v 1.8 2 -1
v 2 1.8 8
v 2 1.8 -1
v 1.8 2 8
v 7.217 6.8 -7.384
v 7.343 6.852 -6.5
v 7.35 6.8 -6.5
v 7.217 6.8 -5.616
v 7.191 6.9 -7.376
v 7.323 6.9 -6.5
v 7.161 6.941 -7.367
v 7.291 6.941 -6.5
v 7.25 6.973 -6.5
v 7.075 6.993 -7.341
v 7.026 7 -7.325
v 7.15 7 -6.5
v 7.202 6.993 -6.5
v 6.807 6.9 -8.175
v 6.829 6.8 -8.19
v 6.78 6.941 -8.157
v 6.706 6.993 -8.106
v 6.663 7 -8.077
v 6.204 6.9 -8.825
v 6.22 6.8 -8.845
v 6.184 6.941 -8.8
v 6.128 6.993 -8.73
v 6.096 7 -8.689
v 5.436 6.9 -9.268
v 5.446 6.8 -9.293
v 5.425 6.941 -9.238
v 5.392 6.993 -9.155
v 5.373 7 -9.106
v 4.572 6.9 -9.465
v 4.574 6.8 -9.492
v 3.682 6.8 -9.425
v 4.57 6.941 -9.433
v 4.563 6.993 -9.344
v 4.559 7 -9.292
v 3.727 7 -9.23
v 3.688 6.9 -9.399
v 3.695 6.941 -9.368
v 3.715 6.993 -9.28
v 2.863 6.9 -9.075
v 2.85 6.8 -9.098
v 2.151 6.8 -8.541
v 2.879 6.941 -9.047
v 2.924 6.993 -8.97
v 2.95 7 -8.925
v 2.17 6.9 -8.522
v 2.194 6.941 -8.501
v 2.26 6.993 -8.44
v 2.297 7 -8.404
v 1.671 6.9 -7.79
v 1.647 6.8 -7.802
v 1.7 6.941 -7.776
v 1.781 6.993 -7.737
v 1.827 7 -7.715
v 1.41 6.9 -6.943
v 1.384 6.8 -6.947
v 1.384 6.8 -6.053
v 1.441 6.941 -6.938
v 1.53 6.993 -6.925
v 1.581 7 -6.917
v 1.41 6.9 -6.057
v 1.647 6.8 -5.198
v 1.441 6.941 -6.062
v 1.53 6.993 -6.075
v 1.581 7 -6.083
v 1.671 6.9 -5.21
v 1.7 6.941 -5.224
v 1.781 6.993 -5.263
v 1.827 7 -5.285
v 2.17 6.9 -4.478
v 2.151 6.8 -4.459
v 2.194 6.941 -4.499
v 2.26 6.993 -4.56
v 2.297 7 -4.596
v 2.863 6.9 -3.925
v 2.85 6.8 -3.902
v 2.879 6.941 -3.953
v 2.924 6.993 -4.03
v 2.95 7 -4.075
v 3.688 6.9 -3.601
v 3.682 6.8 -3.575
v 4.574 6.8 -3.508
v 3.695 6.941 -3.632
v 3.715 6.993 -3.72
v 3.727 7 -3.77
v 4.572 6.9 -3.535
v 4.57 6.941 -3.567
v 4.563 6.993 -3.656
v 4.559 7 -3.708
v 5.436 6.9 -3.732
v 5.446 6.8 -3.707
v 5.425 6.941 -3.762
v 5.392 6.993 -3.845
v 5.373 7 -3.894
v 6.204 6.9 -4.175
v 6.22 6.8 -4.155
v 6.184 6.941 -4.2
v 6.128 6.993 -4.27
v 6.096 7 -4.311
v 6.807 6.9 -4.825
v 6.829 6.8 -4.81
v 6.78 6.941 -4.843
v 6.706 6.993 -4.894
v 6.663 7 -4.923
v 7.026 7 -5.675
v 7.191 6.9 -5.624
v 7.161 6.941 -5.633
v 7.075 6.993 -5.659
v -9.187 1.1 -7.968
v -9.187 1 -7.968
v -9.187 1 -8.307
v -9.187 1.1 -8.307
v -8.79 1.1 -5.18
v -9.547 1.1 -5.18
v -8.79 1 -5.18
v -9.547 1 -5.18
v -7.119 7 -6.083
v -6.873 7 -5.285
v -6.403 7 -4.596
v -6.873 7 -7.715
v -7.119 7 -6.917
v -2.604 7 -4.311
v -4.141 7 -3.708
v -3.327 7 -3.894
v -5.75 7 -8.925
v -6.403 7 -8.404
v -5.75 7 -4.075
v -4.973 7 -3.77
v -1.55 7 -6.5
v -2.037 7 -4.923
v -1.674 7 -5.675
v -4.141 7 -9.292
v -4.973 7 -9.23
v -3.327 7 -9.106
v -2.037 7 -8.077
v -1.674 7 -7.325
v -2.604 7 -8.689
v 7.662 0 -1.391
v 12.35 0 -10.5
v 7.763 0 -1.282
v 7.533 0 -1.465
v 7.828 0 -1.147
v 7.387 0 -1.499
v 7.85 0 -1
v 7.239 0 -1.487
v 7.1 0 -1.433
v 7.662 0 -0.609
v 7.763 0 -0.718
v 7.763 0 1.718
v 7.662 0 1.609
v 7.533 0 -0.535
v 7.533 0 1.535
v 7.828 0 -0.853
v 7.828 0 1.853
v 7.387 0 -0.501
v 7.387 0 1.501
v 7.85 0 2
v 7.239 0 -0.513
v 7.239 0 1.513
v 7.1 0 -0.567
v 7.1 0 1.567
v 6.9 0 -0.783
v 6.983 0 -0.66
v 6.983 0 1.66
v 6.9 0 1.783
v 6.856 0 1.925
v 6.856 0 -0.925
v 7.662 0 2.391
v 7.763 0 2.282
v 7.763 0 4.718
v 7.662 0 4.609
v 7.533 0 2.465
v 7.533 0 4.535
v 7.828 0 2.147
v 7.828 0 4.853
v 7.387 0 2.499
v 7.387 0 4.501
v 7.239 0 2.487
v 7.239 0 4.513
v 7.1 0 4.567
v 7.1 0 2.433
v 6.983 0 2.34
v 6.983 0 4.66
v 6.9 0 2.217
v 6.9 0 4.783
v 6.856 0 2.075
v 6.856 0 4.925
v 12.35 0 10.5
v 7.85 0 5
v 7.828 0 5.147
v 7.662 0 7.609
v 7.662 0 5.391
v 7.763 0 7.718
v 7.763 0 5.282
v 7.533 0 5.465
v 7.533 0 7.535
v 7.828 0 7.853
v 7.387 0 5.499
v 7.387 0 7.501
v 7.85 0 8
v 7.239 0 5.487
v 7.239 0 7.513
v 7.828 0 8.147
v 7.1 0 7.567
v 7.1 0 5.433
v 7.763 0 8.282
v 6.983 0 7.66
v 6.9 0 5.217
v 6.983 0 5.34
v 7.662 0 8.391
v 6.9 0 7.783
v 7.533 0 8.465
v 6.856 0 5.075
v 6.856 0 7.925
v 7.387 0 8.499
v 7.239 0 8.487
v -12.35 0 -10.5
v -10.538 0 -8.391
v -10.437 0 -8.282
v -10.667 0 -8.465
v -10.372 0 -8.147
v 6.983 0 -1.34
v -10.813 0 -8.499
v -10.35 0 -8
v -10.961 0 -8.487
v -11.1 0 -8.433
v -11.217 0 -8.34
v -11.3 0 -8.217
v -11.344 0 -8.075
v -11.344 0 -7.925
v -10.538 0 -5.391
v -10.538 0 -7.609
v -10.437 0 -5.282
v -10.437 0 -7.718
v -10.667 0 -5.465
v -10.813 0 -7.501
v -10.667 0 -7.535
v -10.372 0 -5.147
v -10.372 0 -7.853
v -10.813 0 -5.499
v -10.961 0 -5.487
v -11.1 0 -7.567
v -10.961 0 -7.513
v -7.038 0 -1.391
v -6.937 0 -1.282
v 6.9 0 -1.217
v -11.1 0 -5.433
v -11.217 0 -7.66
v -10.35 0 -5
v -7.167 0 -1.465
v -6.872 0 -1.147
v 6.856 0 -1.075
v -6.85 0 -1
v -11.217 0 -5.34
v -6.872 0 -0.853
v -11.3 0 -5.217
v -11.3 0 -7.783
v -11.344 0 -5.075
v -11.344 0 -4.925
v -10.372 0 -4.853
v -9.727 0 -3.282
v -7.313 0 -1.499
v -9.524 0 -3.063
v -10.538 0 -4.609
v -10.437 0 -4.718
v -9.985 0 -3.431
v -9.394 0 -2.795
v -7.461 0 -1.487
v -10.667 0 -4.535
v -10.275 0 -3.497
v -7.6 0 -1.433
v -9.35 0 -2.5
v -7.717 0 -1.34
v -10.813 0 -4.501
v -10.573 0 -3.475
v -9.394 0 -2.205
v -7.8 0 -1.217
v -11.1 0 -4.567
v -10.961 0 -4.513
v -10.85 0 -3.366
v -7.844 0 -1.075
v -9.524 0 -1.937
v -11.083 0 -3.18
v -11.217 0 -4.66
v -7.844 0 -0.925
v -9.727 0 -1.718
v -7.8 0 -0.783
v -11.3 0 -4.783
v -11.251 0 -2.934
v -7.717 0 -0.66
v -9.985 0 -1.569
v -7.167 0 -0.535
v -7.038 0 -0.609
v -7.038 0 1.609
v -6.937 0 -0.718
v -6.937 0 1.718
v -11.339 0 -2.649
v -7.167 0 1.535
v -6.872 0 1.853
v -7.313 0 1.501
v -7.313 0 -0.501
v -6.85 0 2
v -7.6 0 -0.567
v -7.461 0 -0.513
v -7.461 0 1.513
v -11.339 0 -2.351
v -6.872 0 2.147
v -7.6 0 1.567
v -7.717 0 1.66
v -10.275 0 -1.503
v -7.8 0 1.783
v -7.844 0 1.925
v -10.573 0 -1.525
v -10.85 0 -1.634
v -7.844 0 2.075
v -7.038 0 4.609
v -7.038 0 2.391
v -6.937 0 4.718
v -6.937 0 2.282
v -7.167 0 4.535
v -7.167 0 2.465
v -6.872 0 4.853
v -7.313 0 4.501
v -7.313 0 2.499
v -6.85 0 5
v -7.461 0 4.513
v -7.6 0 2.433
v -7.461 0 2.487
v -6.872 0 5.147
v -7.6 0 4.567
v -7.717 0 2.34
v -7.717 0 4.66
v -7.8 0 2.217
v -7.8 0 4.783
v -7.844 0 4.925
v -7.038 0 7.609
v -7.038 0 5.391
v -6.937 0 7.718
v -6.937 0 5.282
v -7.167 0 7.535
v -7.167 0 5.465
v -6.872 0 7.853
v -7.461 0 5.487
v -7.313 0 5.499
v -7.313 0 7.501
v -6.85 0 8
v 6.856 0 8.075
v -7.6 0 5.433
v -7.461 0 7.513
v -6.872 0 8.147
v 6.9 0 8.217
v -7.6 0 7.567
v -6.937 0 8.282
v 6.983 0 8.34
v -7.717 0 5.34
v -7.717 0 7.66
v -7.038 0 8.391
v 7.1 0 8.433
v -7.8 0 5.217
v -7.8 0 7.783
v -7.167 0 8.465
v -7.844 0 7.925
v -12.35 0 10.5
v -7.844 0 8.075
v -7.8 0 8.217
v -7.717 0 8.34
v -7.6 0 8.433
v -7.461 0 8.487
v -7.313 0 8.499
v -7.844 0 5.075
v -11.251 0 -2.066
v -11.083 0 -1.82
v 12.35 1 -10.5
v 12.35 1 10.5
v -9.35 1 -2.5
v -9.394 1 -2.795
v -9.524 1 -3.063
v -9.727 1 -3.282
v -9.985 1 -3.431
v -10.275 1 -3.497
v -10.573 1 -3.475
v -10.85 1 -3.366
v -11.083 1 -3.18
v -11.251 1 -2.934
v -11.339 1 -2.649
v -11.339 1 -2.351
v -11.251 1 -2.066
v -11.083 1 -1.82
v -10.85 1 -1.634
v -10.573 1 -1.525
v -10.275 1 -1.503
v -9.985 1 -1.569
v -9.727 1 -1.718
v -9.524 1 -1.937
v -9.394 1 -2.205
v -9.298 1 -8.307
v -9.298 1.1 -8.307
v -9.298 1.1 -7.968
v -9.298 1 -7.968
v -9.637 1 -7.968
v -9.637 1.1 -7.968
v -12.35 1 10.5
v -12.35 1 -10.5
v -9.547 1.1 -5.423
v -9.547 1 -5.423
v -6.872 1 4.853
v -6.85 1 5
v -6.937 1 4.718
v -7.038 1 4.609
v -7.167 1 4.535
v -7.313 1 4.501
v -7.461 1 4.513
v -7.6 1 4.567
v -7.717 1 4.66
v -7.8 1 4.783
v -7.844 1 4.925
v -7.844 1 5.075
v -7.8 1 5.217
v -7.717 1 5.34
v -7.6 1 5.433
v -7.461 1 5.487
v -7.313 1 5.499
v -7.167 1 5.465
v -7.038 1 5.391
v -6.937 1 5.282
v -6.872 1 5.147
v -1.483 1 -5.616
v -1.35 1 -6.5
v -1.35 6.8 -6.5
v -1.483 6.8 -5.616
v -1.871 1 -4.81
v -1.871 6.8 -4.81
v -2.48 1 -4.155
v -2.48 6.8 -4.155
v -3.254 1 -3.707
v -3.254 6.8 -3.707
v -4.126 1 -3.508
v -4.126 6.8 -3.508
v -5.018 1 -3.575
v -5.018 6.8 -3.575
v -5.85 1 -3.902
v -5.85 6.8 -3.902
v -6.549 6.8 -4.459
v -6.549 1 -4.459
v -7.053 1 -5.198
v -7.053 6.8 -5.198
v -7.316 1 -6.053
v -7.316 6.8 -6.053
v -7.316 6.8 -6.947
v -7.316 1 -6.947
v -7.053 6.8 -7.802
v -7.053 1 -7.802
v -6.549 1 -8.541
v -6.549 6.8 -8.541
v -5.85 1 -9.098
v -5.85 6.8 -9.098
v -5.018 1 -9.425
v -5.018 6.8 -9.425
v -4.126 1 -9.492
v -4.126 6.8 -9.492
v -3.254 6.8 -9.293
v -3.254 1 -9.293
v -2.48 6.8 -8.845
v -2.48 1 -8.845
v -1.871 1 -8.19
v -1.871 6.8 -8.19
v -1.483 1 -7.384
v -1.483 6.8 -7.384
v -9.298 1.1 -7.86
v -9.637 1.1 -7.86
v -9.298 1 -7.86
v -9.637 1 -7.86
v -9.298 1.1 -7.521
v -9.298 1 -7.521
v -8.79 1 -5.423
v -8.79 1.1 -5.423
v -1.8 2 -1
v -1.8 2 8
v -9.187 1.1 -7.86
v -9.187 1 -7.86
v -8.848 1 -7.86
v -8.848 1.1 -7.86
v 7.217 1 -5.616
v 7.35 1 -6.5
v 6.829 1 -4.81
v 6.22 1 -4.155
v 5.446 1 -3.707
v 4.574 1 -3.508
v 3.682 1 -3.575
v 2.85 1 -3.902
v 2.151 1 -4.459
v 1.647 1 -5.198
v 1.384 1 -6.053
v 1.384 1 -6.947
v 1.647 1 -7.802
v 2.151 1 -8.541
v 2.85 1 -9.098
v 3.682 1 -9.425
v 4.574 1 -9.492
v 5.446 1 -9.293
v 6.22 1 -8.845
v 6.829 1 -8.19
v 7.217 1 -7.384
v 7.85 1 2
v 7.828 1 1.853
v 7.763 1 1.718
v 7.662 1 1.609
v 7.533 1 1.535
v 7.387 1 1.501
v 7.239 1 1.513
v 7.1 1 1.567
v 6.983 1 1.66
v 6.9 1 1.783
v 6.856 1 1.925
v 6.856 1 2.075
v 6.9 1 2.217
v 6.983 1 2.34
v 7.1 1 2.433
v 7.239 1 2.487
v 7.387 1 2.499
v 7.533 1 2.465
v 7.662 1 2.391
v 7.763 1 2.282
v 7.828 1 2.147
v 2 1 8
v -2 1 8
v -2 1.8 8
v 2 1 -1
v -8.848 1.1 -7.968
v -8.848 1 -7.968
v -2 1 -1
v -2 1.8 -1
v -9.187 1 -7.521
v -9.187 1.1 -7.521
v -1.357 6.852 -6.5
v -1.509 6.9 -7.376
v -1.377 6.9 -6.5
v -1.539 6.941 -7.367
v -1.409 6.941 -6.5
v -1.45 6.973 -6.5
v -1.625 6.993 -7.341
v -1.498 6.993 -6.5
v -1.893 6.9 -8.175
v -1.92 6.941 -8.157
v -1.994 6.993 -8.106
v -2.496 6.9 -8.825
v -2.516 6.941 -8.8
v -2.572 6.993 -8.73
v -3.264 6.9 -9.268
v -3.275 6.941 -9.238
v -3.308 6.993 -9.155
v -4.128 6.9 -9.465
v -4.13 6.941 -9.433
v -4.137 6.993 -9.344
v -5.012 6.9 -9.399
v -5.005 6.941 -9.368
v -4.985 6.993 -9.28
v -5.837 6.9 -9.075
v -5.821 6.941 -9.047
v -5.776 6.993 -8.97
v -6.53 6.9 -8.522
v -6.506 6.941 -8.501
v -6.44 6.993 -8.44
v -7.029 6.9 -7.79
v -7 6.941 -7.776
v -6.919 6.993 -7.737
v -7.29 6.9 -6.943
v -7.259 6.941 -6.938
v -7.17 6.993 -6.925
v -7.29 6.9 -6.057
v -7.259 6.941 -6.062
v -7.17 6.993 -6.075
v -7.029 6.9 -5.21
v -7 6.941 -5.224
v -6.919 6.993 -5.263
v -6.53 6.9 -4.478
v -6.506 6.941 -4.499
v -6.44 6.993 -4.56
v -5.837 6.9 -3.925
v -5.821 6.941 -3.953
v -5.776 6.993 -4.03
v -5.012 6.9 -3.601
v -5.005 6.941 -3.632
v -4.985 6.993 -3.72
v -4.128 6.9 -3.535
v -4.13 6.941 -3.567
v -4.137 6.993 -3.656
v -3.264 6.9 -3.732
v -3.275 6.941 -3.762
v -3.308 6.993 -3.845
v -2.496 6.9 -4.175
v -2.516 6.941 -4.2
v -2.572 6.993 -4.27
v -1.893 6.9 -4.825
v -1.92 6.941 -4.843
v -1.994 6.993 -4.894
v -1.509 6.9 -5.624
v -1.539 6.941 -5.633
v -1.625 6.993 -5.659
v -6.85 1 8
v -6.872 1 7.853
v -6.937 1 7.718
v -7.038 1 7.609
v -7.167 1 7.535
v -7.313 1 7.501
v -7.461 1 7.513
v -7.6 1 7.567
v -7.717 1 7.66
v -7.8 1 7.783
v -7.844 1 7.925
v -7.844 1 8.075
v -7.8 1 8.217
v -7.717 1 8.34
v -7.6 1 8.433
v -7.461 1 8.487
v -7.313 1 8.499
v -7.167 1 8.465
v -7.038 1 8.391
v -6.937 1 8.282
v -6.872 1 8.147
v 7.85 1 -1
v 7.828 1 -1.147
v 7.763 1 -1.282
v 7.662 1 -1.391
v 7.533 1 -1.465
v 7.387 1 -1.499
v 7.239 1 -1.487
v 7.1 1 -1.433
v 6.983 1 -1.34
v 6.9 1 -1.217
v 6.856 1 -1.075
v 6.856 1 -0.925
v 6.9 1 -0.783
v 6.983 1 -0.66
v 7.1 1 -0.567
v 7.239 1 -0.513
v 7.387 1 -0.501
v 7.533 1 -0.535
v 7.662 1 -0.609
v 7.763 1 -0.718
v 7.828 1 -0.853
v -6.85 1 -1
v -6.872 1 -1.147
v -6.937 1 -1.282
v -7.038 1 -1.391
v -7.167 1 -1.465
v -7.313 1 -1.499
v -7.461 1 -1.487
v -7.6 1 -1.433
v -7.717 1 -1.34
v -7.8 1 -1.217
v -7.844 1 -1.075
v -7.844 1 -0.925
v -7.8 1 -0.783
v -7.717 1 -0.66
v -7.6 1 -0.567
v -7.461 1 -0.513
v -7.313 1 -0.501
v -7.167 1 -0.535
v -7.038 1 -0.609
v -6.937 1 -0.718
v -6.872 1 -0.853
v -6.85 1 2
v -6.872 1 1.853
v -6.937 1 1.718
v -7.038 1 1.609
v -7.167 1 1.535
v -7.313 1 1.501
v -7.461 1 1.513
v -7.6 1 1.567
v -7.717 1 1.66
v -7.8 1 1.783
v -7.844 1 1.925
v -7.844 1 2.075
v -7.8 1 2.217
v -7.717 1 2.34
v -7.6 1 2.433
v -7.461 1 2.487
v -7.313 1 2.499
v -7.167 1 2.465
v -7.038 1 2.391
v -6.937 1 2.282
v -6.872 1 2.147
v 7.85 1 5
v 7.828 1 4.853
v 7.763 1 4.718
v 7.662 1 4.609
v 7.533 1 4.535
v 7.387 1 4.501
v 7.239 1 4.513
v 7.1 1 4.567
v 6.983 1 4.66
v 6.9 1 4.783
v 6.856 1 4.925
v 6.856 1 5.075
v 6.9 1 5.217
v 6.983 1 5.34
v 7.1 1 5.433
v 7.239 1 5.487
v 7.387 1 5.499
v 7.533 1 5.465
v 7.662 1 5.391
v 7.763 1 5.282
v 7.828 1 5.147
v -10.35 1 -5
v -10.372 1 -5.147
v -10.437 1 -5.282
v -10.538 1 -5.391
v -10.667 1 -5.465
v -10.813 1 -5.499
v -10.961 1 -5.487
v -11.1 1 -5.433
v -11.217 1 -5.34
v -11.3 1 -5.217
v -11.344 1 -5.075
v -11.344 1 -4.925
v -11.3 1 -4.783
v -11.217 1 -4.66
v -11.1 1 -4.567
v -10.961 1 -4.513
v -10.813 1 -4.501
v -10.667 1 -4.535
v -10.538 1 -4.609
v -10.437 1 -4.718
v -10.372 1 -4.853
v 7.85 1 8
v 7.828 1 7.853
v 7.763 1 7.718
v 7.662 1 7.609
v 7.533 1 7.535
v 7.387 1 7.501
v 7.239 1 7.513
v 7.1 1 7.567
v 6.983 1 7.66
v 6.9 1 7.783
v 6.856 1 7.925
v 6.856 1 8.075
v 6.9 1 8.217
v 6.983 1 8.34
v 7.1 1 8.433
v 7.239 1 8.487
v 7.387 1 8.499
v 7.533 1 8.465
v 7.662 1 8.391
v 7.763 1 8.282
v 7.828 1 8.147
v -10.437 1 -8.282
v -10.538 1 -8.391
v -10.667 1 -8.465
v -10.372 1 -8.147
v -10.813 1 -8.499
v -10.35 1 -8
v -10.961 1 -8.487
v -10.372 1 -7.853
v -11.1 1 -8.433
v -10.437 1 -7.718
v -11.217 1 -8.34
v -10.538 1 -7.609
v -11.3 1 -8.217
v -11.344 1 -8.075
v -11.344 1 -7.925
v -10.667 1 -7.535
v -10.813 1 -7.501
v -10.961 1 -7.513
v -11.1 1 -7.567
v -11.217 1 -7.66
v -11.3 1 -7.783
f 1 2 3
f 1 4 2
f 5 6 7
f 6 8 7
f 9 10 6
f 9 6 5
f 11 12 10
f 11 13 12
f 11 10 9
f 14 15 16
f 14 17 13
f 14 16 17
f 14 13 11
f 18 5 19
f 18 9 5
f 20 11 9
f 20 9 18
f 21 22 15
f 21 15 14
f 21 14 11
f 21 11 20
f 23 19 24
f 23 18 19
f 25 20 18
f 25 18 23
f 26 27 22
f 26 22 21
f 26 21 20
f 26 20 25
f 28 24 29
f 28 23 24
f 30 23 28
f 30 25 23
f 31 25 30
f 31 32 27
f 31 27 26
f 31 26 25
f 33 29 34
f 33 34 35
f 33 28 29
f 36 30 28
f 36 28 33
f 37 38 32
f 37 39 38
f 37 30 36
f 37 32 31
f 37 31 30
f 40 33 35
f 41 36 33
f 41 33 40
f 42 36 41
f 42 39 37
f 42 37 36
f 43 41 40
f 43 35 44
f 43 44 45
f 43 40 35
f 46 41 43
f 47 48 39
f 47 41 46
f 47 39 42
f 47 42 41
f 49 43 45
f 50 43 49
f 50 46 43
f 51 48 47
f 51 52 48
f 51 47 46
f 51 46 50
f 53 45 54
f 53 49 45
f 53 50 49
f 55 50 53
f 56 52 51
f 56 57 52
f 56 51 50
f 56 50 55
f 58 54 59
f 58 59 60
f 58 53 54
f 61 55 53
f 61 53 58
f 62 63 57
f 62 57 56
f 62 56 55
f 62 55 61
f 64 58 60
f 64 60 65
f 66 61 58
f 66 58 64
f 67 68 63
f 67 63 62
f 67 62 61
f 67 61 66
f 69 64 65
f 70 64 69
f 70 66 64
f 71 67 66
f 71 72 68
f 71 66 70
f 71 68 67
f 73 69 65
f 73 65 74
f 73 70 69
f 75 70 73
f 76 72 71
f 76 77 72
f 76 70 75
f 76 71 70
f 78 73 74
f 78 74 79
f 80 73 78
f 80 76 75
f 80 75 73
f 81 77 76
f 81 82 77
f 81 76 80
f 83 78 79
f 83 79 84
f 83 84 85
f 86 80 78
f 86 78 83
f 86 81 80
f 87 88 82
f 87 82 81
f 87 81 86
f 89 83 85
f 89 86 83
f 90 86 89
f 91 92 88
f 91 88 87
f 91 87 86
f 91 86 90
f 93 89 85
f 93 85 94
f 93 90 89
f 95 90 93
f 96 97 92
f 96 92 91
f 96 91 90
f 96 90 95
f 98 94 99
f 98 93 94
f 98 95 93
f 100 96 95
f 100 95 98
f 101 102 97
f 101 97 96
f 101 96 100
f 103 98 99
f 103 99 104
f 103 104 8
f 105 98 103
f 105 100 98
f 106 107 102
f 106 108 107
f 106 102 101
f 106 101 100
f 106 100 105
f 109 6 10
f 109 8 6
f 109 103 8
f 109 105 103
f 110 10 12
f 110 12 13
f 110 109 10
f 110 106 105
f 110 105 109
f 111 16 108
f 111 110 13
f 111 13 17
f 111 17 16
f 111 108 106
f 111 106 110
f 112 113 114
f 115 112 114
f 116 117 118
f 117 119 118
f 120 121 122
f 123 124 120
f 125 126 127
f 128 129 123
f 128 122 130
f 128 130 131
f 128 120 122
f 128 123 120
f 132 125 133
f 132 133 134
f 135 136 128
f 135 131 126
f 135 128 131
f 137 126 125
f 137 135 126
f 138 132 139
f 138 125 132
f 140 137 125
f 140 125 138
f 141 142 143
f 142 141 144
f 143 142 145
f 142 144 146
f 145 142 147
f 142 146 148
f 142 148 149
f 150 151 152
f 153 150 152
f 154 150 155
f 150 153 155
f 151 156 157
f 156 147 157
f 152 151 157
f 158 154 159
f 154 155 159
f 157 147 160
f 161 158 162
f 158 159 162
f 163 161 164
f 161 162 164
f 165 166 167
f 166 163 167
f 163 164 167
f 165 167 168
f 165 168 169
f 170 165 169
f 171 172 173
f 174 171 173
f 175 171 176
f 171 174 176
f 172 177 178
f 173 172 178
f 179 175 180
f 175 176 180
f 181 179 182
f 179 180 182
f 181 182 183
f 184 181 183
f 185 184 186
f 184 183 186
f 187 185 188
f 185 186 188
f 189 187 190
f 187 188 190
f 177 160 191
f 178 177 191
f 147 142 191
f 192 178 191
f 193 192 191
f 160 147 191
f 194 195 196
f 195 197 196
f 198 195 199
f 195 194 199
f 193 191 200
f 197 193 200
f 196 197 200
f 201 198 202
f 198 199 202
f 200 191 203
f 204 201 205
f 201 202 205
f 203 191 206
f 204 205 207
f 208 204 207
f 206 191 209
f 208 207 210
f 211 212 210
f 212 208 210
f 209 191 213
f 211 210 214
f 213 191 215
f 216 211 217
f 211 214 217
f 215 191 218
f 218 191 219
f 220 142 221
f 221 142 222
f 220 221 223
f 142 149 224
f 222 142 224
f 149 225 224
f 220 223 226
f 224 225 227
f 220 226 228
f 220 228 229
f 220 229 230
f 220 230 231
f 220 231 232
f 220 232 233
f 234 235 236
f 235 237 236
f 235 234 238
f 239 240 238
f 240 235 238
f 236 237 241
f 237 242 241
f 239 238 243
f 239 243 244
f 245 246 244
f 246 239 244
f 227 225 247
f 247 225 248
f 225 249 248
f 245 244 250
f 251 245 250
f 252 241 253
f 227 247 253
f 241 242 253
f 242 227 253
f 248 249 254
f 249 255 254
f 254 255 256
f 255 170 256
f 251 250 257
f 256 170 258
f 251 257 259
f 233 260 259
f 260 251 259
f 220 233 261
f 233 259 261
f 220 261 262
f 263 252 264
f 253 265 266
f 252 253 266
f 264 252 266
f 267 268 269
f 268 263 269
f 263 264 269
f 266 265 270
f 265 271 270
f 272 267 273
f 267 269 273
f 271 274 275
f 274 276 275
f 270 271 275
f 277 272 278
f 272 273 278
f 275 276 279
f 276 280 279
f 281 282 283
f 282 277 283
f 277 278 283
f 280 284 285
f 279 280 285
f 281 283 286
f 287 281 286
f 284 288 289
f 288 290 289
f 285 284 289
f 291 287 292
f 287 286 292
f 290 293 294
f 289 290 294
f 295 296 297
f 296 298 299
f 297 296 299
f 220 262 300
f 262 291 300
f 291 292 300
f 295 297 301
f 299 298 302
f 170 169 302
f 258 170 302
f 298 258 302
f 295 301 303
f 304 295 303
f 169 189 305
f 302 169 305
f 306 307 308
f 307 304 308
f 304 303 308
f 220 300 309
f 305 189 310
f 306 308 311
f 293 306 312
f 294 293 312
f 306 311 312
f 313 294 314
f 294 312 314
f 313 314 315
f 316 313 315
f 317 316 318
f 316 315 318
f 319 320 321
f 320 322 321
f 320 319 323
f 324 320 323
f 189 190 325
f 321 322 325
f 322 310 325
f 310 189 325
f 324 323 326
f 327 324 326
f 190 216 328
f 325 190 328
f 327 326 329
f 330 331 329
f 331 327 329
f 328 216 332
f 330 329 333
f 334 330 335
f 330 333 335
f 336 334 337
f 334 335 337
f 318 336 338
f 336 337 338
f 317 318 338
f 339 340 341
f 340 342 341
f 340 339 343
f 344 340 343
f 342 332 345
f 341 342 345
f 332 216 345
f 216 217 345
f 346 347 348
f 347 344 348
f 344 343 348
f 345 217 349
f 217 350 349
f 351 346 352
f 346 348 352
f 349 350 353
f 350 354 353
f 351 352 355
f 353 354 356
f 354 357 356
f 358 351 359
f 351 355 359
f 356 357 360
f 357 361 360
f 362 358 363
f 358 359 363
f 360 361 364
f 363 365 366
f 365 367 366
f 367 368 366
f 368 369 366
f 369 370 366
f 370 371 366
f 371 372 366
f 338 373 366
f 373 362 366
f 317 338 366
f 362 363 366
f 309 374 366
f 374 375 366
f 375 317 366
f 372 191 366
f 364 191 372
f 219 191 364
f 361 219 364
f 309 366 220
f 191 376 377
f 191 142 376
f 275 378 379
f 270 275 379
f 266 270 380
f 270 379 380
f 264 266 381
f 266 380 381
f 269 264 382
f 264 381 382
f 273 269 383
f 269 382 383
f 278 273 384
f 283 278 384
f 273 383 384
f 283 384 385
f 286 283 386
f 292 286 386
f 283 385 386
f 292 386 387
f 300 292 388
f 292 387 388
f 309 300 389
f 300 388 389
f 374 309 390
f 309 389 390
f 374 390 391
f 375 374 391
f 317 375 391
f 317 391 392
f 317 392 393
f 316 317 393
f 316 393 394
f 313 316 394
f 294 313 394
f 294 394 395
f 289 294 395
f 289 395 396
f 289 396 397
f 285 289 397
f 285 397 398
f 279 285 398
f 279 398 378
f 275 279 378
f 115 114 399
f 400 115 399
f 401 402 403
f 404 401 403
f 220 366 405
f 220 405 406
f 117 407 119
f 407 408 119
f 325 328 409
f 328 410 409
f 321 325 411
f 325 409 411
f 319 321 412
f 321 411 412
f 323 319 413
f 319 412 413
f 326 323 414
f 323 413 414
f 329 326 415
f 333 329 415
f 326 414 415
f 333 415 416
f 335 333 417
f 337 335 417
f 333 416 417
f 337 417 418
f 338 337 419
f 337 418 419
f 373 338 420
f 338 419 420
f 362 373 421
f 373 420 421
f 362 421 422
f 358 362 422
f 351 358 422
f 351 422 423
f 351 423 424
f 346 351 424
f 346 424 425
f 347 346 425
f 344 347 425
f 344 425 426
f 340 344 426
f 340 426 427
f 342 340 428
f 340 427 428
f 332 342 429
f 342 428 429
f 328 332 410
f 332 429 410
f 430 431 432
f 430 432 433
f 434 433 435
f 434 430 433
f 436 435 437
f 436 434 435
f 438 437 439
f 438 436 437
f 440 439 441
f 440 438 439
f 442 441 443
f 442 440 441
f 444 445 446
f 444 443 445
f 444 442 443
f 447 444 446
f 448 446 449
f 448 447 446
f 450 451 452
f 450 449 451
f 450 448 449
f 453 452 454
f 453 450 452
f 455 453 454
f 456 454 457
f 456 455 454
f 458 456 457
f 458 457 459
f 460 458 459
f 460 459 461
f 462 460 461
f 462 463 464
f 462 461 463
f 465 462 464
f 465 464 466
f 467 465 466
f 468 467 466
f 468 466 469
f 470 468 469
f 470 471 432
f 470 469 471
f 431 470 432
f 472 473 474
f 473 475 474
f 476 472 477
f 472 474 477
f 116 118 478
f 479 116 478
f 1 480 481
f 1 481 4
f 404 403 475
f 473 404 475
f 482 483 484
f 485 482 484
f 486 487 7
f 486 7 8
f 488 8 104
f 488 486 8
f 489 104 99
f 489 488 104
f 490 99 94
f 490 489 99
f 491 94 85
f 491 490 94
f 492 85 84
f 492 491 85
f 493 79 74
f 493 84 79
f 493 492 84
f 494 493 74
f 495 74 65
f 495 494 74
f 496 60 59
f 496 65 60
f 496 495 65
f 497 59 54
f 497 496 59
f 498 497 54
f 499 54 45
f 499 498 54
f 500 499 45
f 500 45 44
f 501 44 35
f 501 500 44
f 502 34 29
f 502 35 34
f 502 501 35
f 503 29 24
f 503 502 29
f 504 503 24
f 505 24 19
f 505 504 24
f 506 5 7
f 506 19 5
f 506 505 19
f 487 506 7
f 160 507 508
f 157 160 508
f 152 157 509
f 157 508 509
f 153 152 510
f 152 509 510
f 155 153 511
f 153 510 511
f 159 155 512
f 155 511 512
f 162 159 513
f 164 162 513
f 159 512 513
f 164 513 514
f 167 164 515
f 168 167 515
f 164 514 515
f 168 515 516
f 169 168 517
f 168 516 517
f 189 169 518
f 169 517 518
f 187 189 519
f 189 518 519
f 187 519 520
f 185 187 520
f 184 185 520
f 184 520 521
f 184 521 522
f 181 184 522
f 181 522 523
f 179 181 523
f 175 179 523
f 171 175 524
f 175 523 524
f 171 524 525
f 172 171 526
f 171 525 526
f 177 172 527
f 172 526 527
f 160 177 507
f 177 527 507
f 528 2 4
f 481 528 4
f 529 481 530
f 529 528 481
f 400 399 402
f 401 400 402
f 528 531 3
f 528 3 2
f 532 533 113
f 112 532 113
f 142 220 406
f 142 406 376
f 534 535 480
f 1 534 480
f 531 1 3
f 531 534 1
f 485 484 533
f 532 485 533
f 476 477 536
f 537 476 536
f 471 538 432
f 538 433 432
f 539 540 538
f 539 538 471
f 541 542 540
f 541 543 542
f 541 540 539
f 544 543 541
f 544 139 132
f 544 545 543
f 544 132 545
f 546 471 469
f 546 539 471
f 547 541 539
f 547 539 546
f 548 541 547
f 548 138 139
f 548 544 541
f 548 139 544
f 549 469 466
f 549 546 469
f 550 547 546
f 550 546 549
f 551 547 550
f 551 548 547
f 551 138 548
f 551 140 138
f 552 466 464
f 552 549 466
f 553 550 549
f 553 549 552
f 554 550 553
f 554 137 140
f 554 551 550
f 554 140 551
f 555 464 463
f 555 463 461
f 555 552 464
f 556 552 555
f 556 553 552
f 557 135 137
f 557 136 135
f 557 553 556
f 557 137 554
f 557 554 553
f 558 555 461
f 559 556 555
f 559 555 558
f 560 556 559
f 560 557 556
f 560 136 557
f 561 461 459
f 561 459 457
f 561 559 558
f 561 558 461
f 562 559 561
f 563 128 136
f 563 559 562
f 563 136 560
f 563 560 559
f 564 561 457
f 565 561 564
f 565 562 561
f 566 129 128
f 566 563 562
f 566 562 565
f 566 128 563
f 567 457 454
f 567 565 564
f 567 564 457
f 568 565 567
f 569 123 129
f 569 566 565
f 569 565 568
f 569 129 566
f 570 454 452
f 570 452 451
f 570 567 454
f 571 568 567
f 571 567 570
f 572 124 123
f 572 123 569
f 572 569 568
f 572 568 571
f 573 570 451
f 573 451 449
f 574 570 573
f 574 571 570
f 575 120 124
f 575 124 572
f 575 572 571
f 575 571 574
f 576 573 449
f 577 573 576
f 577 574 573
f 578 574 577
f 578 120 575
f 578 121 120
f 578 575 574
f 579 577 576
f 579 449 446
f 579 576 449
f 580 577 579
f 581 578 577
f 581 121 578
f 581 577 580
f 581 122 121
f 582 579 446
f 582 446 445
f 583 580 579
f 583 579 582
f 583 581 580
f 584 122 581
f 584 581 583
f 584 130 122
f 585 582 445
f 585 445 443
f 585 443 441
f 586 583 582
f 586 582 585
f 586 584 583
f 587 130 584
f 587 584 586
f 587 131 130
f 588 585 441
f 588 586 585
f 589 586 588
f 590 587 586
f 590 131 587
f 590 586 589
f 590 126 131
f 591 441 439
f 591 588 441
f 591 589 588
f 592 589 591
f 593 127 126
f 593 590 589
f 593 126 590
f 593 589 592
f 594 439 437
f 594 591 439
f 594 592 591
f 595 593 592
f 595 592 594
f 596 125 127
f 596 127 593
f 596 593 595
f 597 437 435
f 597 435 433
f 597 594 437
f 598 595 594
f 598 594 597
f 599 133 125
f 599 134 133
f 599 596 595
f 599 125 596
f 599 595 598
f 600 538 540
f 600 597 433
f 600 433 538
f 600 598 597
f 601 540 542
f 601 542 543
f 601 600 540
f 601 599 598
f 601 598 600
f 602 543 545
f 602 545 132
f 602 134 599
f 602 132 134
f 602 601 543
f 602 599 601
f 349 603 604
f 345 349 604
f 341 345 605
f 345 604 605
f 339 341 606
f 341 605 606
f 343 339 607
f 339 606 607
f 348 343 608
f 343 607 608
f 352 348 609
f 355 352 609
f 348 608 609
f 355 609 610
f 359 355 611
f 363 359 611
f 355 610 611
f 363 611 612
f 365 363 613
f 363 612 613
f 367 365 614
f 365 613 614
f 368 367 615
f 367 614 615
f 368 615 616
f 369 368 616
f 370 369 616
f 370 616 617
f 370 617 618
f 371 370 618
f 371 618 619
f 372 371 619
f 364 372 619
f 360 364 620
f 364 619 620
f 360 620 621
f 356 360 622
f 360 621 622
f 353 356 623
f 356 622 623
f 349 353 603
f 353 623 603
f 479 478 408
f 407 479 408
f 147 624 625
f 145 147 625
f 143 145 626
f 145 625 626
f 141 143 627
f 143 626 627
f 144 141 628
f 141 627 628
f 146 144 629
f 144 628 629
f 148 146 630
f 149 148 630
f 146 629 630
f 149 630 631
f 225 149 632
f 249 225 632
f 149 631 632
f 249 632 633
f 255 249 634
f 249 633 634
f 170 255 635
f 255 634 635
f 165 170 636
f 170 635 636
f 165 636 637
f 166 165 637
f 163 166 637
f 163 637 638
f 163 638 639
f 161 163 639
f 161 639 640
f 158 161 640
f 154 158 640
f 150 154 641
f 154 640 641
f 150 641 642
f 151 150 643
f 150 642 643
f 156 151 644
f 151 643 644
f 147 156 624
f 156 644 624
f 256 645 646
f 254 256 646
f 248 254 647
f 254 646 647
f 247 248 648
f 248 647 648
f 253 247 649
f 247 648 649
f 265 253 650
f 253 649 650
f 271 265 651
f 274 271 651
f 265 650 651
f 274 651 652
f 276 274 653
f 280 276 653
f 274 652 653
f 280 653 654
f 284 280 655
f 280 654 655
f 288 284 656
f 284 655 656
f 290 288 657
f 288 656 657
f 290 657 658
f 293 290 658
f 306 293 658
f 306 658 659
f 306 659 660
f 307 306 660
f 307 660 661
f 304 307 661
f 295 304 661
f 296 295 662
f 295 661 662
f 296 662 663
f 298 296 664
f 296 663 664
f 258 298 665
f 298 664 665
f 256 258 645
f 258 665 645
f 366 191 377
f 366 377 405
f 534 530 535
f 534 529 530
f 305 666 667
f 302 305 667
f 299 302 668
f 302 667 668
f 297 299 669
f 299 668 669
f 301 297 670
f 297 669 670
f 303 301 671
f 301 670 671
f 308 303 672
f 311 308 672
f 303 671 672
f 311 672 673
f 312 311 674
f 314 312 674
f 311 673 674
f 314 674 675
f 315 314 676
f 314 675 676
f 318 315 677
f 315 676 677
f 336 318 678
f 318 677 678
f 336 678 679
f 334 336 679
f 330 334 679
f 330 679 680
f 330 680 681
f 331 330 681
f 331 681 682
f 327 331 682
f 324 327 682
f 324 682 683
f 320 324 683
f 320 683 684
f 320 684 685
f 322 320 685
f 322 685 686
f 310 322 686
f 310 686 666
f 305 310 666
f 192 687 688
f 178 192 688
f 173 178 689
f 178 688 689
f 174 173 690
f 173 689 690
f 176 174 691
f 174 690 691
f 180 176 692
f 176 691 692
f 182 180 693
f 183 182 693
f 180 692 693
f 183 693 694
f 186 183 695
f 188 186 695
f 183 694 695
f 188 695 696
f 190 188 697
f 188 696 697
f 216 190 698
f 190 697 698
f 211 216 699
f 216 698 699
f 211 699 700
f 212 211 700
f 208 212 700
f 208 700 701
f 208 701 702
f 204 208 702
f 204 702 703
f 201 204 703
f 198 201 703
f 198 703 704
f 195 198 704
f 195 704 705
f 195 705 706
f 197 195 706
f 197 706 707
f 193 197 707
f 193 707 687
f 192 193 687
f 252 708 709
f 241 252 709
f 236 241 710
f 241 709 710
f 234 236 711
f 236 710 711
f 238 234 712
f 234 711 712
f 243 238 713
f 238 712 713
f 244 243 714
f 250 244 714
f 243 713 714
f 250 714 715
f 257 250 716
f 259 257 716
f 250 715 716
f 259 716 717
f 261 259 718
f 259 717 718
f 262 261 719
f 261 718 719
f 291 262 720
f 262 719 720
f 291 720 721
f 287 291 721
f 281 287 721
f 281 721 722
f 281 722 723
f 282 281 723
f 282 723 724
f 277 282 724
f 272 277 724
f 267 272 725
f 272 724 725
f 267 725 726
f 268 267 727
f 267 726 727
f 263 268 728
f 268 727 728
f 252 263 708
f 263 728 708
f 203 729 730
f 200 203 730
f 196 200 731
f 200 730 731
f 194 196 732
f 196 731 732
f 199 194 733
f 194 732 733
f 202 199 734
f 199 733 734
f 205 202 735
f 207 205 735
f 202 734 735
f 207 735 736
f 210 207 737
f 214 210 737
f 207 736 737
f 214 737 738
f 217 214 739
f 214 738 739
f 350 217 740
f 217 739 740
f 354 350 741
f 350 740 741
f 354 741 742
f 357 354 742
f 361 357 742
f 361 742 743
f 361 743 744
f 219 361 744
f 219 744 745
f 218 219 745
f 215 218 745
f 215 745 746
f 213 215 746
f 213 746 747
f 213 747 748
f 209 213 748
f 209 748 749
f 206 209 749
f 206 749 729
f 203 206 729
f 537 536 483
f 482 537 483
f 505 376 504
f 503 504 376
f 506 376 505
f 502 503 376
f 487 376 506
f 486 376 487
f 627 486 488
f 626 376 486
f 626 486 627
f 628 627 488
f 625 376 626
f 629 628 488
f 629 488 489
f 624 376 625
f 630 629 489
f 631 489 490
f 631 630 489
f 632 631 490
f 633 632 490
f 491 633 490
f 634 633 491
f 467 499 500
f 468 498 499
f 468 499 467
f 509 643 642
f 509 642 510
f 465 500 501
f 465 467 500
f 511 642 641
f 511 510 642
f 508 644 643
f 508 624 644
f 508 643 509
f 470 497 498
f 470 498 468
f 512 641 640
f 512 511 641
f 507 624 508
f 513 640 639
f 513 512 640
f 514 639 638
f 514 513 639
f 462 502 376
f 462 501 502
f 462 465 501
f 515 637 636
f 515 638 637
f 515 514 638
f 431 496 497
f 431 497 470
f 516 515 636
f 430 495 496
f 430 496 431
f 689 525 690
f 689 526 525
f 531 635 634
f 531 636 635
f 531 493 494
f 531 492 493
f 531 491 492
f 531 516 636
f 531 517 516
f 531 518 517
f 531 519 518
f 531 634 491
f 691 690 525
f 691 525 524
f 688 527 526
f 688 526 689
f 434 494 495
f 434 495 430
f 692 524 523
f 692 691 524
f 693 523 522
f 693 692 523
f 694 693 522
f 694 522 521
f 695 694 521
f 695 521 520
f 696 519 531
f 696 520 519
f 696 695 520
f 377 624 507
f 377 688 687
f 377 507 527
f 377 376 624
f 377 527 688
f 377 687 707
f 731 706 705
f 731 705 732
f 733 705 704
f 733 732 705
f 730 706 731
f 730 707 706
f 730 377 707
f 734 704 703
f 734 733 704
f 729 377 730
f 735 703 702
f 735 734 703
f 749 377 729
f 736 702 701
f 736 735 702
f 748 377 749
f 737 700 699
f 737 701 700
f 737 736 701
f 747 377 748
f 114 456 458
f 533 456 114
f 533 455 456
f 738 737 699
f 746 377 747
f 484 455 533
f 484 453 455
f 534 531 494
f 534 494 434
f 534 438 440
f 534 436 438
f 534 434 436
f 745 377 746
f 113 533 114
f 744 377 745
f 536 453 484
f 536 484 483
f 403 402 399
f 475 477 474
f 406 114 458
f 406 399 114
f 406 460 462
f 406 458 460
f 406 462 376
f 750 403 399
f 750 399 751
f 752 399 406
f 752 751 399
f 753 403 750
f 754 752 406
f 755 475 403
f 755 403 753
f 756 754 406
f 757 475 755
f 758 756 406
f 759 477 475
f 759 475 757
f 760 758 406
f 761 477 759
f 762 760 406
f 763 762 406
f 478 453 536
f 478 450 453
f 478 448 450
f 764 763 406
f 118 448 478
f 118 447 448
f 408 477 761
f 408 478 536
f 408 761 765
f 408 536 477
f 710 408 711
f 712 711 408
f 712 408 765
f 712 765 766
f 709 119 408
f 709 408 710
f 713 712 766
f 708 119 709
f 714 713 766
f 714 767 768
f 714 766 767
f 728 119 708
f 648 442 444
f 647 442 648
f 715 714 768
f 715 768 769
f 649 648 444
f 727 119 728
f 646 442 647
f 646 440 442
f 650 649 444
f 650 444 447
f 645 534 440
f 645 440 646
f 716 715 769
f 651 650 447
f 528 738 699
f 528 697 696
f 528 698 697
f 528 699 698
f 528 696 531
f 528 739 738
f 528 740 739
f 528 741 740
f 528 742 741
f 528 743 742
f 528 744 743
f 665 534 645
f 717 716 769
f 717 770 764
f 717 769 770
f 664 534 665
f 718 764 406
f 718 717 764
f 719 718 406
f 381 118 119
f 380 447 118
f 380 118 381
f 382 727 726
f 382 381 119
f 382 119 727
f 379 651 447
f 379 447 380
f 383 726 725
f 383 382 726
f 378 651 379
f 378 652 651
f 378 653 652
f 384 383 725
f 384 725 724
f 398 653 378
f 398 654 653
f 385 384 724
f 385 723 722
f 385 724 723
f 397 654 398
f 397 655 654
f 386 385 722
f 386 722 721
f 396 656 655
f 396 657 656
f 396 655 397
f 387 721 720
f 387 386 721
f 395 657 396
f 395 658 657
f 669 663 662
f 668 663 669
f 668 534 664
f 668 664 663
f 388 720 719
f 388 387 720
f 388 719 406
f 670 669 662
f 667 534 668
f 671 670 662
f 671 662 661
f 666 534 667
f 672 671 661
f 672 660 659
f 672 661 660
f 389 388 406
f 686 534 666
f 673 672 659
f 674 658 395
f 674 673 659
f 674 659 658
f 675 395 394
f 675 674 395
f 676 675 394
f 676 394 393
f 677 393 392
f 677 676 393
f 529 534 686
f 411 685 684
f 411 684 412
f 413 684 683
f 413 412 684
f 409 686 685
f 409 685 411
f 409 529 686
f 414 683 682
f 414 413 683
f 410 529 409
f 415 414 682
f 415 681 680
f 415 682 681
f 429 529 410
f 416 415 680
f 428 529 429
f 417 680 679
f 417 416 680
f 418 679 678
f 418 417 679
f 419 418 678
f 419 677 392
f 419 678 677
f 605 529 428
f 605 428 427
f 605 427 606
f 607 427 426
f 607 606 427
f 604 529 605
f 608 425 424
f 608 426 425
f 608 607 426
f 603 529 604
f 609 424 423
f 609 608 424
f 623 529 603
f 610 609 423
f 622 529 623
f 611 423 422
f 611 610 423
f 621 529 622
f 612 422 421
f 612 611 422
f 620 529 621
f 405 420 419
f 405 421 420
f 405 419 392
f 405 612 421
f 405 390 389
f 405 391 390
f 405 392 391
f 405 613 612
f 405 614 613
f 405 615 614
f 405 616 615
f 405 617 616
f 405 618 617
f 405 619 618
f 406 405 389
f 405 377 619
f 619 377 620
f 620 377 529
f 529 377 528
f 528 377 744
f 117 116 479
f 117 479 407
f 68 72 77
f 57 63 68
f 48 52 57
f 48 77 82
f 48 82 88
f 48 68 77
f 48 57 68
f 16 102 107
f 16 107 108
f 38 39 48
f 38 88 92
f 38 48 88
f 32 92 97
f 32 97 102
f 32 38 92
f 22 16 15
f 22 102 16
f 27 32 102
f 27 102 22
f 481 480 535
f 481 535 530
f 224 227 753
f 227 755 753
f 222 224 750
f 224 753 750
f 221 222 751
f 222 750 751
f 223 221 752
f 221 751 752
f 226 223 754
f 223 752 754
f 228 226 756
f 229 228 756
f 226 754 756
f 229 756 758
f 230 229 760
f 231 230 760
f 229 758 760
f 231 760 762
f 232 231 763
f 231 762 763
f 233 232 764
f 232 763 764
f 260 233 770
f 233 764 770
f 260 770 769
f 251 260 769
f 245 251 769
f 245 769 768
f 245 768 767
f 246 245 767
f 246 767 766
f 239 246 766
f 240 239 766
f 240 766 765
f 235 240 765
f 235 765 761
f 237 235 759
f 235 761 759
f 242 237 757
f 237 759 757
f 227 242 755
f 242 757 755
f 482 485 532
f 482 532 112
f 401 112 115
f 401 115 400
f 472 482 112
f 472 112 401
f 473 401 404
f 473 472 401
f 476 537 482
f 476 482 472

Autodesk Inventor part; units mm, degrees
ref_plane "YZ Plane" through (0, 0, 0) normal (1, 0, 0) x (0, 1, 0)
ref_plane "XZ Plane" through (0, 0, 0) normal (0, 1, 0) x (-1, 0, 0)
ref_plane "XY Plane" through (0, 0, 0) normal (0, 0, 1) x (1, 0, 0)
sketch "Sketch1" plane through (0, 0, 0) normal (0, 1, 0) x (-1, 0, 0)
  line L0 (-12.35, 10.5) -> (12.35, 10.5)
  line L1 (12.35, 10.5) -> (12.35, -10.5)
  line L2 (12.35, -10.5) -> (-12.35, -10.5)
  line L3 (-12.35, -10.5) -> (-12.35, 10.5)
  line L4 (-12.35, 10.5) -> (12.35, -10.5) construction
  line L5 (12.35, 10.5) -> (-12.35, -10.5) construction
  point P0 (0, 0)
  dimension "d0" = 21
  dimension "d1" = 24.7
extrude "Extrusion1" add sketch "Sketch1" along normal blind 1
sketch "Sketch2" plane through (0, 1, 0) normal (0, 1, 0) x (1, 0, 0)
  circle A0 centre (-10.35, 2.5) radius 1
  line L0 (12.35, 10.5) -> (-12.35, 10.5) projected
  line L1 (-12.35, 10.5) -> (-12.35, -10.5) projected
  point P0 (0, 0)
  dimension "d4" = 2
  dimension "d5" = 8
  dimension "d6" = 2
extrude "Extrusion2" cut sketch "Sketch2" against normal blind 1
sketch "Sketch3" plane through (0, 1, 0) normal (0, 1, 0) x (1, 0, 0)
  circle A0 centre (-4.35, 6.5) radius 3
  line L0 (-12.35, 10.5) -> (-12.35, -10.5) projected
  line L1 (12.35, 10.5) -> (-12.35, 10.5) projected
  line L2 (0, 0) -> (0, 10.5) construction
  circle A1 centre (4.35, 6.5) radius 3
  dimension "d9" = 6
  dimension "d10" = 8
  dimension "d11" = 4
extrude "Extrusion3" add sketch "Sketch3" along normal blind 6
fillet "Fillet1" radius 0.2 2 edges at (-7.35, 7, -6.5) (1.35, 7, -6.5)
sketch "Sketch4" plane through (0, 1, 0) normal (0, 1, 0) x (1, 0, 0)
  circle A0 centre (-7.35, 1) radius 0.5
  circle A1 centre (-7.35, -2) radius 0.5
  circle A2 centre (-10.35, 2.5) radius 1 projected
  line L0 (-10.35, 1.5) -> (-7.35, 1.5) construction
  circle A3 centre (-7.35, -5) radius 0.5
  circle A4 centre (-7.35, -8) radius 0.5
  circle A5 centre (-4.35, 6.5) radius 3 projected
  line L1 (-7.35, 6.5) -> (-7.35, 1.5) construction
  line L2 (0, 0) -> (0, -10.5851) construction
  circle A6 centre (7.35, 1) radius 0.5
  circle A7 centre (7.35, -2) radius 0.5
  circle A8 centre (7.35, -5) radius 0.5
  circle A9 centre (7.35, -8) radius 0.5
  dimension "d15" = 1
  dimension "d16" = 1
  dimension "d17" = 1
  dimension "d18" = 1
  dimension "d19" = 3
  dimension "d20" = 3
  dimension "d21" = 3
extrude "Extrusion4" cut sketch "Sketch4" against normal blind 1 contours A0 | A1 | A3 | A4 | A6 | A7 | A8 | A9
sketch "Sketch5" plane through (0, 1, 0) normal (0, 1, 0) x (1, 0, 0)
  line L0 (-2, 1) -> (2, 1)
  line L1 (2, 1) -> (2, -8)
  line L2 (2, -8) -> (-2, -8)
  line L3 (-2, -8) -> (-2, 1)
  circle A0 centre (-7.35, 1) radius 0.5 projected
  point P0 (0, 0)
  point P1 (0, 1)
  dimension "d26" = 4
  dimension "d27" = 9
extrude "Extrusion5" add sketch "Sketch5" along normal blind 1 contours L0 L1 L2 L3
chamfer "Chamfer1" distance 0.2 angle 45 2 edges at (2, 2, 3.5) (-2, 2, 3.5)
sketch "Sketch6" plane through (0, 1, 0) normal (0, 1, 0) x (1, 0, 0)
  circle A0 centre (-10.85, 8) radius 0.5
  circle A1 centre (-10.85, 5) radius 0.5
  line L0 (12.35, 10.5) -> (-12.35, 10.5) projected
  line L1 (-12.35, 10.5) -> (-12.35, -10.5) projected
  point P0 (0, 0)
  dimension "d33" = 1
  dimension "d34" = 1
  dimension "d35" = 2.5
  dimension "d36" = 1.5
  dimension "d37" = 3
extrude "Extrusion6" cut sketch "Sketch6" against normal blind 1
sketch "Sketch7" plane through (0, 1, 0) normal (0, 1, 0) x (1, 0, 0)
  line L0 (-9.7434, 8.3067) -> (-6.693, 8.3067) construction
  line L1 (-6.693, 8.3067) -> (-6.693, 5.9132) construction
  line L2 (-6.693, 5.9132) -> (-9.7434, 5.9132) construction
  line L3 (-9.7434, 5.9132) -> (-9.7434, 8.3067) construction
  line L4 (-9.6683, 5.4228) -> (-8.67, 5.4228) construction
  line L5 (-8.67, 5.4228) -> (-8.67, 5.1797) construction
  line L6 (-8.67, 5.1797) -> (-9.6683, 5.1797) construction
  line L7 (-9.6683, 5.1797) -> (-9.6683, 5.4228) construction
  line L8 (-8.848, 7.8602) -> (-9.1867, 7.8602)
  line L9 (-9.1867, 7.8602) -> (-9.1867, 7.5214)
  line L10 (-9.1867, 7.5214) -> (-9.2985, 7.5214)
  line L11 (-9.2985, 7.5214) -> (-9.2985, 7.8602)
  line L12 (-9.2985, 7.8602) -> (-9.6373, 7.8602)
  line L13 (-9.6373, 7.8602) -> (-9.6373, 7.9679)
  line L14 (-9.6373, 7.9679) -> (-9.2985, 7.9679)
  line L15 (-9.2985, 7.9679) -> (-9.2985, 8.3067)
  line L16 (-9.2985, 8.3067) -> (-9.1867, 8.3067)
  line L17 (-9.1867, 8.3067) -> (-9.1867, 7.9679)
  line L18 (-9.1867, 7.9679) -> (-8.848, 7.9679)
  line L19 (-8.848, 7.9679) -> (-8.848, 7.8602)
  line L20 (-8.7899, 5.1797) -> (-9.5468, 5.1797)
  line L21 (-9.5468, 5.1797) -> (-9.5468, 5.4228)
  line L22 (-9.5468, 5.4228) -> (-8.7899, 5.4228)
  line L23 (-8.7899, 5.4228) -> (-8.7899, 5.1797)
  point P0 (0, 0)
emboss "Emboss1" sketch "Sketch7" operation add depth 0.1 direction (0, -1, 0)
properties part number "L298N_CPY"
